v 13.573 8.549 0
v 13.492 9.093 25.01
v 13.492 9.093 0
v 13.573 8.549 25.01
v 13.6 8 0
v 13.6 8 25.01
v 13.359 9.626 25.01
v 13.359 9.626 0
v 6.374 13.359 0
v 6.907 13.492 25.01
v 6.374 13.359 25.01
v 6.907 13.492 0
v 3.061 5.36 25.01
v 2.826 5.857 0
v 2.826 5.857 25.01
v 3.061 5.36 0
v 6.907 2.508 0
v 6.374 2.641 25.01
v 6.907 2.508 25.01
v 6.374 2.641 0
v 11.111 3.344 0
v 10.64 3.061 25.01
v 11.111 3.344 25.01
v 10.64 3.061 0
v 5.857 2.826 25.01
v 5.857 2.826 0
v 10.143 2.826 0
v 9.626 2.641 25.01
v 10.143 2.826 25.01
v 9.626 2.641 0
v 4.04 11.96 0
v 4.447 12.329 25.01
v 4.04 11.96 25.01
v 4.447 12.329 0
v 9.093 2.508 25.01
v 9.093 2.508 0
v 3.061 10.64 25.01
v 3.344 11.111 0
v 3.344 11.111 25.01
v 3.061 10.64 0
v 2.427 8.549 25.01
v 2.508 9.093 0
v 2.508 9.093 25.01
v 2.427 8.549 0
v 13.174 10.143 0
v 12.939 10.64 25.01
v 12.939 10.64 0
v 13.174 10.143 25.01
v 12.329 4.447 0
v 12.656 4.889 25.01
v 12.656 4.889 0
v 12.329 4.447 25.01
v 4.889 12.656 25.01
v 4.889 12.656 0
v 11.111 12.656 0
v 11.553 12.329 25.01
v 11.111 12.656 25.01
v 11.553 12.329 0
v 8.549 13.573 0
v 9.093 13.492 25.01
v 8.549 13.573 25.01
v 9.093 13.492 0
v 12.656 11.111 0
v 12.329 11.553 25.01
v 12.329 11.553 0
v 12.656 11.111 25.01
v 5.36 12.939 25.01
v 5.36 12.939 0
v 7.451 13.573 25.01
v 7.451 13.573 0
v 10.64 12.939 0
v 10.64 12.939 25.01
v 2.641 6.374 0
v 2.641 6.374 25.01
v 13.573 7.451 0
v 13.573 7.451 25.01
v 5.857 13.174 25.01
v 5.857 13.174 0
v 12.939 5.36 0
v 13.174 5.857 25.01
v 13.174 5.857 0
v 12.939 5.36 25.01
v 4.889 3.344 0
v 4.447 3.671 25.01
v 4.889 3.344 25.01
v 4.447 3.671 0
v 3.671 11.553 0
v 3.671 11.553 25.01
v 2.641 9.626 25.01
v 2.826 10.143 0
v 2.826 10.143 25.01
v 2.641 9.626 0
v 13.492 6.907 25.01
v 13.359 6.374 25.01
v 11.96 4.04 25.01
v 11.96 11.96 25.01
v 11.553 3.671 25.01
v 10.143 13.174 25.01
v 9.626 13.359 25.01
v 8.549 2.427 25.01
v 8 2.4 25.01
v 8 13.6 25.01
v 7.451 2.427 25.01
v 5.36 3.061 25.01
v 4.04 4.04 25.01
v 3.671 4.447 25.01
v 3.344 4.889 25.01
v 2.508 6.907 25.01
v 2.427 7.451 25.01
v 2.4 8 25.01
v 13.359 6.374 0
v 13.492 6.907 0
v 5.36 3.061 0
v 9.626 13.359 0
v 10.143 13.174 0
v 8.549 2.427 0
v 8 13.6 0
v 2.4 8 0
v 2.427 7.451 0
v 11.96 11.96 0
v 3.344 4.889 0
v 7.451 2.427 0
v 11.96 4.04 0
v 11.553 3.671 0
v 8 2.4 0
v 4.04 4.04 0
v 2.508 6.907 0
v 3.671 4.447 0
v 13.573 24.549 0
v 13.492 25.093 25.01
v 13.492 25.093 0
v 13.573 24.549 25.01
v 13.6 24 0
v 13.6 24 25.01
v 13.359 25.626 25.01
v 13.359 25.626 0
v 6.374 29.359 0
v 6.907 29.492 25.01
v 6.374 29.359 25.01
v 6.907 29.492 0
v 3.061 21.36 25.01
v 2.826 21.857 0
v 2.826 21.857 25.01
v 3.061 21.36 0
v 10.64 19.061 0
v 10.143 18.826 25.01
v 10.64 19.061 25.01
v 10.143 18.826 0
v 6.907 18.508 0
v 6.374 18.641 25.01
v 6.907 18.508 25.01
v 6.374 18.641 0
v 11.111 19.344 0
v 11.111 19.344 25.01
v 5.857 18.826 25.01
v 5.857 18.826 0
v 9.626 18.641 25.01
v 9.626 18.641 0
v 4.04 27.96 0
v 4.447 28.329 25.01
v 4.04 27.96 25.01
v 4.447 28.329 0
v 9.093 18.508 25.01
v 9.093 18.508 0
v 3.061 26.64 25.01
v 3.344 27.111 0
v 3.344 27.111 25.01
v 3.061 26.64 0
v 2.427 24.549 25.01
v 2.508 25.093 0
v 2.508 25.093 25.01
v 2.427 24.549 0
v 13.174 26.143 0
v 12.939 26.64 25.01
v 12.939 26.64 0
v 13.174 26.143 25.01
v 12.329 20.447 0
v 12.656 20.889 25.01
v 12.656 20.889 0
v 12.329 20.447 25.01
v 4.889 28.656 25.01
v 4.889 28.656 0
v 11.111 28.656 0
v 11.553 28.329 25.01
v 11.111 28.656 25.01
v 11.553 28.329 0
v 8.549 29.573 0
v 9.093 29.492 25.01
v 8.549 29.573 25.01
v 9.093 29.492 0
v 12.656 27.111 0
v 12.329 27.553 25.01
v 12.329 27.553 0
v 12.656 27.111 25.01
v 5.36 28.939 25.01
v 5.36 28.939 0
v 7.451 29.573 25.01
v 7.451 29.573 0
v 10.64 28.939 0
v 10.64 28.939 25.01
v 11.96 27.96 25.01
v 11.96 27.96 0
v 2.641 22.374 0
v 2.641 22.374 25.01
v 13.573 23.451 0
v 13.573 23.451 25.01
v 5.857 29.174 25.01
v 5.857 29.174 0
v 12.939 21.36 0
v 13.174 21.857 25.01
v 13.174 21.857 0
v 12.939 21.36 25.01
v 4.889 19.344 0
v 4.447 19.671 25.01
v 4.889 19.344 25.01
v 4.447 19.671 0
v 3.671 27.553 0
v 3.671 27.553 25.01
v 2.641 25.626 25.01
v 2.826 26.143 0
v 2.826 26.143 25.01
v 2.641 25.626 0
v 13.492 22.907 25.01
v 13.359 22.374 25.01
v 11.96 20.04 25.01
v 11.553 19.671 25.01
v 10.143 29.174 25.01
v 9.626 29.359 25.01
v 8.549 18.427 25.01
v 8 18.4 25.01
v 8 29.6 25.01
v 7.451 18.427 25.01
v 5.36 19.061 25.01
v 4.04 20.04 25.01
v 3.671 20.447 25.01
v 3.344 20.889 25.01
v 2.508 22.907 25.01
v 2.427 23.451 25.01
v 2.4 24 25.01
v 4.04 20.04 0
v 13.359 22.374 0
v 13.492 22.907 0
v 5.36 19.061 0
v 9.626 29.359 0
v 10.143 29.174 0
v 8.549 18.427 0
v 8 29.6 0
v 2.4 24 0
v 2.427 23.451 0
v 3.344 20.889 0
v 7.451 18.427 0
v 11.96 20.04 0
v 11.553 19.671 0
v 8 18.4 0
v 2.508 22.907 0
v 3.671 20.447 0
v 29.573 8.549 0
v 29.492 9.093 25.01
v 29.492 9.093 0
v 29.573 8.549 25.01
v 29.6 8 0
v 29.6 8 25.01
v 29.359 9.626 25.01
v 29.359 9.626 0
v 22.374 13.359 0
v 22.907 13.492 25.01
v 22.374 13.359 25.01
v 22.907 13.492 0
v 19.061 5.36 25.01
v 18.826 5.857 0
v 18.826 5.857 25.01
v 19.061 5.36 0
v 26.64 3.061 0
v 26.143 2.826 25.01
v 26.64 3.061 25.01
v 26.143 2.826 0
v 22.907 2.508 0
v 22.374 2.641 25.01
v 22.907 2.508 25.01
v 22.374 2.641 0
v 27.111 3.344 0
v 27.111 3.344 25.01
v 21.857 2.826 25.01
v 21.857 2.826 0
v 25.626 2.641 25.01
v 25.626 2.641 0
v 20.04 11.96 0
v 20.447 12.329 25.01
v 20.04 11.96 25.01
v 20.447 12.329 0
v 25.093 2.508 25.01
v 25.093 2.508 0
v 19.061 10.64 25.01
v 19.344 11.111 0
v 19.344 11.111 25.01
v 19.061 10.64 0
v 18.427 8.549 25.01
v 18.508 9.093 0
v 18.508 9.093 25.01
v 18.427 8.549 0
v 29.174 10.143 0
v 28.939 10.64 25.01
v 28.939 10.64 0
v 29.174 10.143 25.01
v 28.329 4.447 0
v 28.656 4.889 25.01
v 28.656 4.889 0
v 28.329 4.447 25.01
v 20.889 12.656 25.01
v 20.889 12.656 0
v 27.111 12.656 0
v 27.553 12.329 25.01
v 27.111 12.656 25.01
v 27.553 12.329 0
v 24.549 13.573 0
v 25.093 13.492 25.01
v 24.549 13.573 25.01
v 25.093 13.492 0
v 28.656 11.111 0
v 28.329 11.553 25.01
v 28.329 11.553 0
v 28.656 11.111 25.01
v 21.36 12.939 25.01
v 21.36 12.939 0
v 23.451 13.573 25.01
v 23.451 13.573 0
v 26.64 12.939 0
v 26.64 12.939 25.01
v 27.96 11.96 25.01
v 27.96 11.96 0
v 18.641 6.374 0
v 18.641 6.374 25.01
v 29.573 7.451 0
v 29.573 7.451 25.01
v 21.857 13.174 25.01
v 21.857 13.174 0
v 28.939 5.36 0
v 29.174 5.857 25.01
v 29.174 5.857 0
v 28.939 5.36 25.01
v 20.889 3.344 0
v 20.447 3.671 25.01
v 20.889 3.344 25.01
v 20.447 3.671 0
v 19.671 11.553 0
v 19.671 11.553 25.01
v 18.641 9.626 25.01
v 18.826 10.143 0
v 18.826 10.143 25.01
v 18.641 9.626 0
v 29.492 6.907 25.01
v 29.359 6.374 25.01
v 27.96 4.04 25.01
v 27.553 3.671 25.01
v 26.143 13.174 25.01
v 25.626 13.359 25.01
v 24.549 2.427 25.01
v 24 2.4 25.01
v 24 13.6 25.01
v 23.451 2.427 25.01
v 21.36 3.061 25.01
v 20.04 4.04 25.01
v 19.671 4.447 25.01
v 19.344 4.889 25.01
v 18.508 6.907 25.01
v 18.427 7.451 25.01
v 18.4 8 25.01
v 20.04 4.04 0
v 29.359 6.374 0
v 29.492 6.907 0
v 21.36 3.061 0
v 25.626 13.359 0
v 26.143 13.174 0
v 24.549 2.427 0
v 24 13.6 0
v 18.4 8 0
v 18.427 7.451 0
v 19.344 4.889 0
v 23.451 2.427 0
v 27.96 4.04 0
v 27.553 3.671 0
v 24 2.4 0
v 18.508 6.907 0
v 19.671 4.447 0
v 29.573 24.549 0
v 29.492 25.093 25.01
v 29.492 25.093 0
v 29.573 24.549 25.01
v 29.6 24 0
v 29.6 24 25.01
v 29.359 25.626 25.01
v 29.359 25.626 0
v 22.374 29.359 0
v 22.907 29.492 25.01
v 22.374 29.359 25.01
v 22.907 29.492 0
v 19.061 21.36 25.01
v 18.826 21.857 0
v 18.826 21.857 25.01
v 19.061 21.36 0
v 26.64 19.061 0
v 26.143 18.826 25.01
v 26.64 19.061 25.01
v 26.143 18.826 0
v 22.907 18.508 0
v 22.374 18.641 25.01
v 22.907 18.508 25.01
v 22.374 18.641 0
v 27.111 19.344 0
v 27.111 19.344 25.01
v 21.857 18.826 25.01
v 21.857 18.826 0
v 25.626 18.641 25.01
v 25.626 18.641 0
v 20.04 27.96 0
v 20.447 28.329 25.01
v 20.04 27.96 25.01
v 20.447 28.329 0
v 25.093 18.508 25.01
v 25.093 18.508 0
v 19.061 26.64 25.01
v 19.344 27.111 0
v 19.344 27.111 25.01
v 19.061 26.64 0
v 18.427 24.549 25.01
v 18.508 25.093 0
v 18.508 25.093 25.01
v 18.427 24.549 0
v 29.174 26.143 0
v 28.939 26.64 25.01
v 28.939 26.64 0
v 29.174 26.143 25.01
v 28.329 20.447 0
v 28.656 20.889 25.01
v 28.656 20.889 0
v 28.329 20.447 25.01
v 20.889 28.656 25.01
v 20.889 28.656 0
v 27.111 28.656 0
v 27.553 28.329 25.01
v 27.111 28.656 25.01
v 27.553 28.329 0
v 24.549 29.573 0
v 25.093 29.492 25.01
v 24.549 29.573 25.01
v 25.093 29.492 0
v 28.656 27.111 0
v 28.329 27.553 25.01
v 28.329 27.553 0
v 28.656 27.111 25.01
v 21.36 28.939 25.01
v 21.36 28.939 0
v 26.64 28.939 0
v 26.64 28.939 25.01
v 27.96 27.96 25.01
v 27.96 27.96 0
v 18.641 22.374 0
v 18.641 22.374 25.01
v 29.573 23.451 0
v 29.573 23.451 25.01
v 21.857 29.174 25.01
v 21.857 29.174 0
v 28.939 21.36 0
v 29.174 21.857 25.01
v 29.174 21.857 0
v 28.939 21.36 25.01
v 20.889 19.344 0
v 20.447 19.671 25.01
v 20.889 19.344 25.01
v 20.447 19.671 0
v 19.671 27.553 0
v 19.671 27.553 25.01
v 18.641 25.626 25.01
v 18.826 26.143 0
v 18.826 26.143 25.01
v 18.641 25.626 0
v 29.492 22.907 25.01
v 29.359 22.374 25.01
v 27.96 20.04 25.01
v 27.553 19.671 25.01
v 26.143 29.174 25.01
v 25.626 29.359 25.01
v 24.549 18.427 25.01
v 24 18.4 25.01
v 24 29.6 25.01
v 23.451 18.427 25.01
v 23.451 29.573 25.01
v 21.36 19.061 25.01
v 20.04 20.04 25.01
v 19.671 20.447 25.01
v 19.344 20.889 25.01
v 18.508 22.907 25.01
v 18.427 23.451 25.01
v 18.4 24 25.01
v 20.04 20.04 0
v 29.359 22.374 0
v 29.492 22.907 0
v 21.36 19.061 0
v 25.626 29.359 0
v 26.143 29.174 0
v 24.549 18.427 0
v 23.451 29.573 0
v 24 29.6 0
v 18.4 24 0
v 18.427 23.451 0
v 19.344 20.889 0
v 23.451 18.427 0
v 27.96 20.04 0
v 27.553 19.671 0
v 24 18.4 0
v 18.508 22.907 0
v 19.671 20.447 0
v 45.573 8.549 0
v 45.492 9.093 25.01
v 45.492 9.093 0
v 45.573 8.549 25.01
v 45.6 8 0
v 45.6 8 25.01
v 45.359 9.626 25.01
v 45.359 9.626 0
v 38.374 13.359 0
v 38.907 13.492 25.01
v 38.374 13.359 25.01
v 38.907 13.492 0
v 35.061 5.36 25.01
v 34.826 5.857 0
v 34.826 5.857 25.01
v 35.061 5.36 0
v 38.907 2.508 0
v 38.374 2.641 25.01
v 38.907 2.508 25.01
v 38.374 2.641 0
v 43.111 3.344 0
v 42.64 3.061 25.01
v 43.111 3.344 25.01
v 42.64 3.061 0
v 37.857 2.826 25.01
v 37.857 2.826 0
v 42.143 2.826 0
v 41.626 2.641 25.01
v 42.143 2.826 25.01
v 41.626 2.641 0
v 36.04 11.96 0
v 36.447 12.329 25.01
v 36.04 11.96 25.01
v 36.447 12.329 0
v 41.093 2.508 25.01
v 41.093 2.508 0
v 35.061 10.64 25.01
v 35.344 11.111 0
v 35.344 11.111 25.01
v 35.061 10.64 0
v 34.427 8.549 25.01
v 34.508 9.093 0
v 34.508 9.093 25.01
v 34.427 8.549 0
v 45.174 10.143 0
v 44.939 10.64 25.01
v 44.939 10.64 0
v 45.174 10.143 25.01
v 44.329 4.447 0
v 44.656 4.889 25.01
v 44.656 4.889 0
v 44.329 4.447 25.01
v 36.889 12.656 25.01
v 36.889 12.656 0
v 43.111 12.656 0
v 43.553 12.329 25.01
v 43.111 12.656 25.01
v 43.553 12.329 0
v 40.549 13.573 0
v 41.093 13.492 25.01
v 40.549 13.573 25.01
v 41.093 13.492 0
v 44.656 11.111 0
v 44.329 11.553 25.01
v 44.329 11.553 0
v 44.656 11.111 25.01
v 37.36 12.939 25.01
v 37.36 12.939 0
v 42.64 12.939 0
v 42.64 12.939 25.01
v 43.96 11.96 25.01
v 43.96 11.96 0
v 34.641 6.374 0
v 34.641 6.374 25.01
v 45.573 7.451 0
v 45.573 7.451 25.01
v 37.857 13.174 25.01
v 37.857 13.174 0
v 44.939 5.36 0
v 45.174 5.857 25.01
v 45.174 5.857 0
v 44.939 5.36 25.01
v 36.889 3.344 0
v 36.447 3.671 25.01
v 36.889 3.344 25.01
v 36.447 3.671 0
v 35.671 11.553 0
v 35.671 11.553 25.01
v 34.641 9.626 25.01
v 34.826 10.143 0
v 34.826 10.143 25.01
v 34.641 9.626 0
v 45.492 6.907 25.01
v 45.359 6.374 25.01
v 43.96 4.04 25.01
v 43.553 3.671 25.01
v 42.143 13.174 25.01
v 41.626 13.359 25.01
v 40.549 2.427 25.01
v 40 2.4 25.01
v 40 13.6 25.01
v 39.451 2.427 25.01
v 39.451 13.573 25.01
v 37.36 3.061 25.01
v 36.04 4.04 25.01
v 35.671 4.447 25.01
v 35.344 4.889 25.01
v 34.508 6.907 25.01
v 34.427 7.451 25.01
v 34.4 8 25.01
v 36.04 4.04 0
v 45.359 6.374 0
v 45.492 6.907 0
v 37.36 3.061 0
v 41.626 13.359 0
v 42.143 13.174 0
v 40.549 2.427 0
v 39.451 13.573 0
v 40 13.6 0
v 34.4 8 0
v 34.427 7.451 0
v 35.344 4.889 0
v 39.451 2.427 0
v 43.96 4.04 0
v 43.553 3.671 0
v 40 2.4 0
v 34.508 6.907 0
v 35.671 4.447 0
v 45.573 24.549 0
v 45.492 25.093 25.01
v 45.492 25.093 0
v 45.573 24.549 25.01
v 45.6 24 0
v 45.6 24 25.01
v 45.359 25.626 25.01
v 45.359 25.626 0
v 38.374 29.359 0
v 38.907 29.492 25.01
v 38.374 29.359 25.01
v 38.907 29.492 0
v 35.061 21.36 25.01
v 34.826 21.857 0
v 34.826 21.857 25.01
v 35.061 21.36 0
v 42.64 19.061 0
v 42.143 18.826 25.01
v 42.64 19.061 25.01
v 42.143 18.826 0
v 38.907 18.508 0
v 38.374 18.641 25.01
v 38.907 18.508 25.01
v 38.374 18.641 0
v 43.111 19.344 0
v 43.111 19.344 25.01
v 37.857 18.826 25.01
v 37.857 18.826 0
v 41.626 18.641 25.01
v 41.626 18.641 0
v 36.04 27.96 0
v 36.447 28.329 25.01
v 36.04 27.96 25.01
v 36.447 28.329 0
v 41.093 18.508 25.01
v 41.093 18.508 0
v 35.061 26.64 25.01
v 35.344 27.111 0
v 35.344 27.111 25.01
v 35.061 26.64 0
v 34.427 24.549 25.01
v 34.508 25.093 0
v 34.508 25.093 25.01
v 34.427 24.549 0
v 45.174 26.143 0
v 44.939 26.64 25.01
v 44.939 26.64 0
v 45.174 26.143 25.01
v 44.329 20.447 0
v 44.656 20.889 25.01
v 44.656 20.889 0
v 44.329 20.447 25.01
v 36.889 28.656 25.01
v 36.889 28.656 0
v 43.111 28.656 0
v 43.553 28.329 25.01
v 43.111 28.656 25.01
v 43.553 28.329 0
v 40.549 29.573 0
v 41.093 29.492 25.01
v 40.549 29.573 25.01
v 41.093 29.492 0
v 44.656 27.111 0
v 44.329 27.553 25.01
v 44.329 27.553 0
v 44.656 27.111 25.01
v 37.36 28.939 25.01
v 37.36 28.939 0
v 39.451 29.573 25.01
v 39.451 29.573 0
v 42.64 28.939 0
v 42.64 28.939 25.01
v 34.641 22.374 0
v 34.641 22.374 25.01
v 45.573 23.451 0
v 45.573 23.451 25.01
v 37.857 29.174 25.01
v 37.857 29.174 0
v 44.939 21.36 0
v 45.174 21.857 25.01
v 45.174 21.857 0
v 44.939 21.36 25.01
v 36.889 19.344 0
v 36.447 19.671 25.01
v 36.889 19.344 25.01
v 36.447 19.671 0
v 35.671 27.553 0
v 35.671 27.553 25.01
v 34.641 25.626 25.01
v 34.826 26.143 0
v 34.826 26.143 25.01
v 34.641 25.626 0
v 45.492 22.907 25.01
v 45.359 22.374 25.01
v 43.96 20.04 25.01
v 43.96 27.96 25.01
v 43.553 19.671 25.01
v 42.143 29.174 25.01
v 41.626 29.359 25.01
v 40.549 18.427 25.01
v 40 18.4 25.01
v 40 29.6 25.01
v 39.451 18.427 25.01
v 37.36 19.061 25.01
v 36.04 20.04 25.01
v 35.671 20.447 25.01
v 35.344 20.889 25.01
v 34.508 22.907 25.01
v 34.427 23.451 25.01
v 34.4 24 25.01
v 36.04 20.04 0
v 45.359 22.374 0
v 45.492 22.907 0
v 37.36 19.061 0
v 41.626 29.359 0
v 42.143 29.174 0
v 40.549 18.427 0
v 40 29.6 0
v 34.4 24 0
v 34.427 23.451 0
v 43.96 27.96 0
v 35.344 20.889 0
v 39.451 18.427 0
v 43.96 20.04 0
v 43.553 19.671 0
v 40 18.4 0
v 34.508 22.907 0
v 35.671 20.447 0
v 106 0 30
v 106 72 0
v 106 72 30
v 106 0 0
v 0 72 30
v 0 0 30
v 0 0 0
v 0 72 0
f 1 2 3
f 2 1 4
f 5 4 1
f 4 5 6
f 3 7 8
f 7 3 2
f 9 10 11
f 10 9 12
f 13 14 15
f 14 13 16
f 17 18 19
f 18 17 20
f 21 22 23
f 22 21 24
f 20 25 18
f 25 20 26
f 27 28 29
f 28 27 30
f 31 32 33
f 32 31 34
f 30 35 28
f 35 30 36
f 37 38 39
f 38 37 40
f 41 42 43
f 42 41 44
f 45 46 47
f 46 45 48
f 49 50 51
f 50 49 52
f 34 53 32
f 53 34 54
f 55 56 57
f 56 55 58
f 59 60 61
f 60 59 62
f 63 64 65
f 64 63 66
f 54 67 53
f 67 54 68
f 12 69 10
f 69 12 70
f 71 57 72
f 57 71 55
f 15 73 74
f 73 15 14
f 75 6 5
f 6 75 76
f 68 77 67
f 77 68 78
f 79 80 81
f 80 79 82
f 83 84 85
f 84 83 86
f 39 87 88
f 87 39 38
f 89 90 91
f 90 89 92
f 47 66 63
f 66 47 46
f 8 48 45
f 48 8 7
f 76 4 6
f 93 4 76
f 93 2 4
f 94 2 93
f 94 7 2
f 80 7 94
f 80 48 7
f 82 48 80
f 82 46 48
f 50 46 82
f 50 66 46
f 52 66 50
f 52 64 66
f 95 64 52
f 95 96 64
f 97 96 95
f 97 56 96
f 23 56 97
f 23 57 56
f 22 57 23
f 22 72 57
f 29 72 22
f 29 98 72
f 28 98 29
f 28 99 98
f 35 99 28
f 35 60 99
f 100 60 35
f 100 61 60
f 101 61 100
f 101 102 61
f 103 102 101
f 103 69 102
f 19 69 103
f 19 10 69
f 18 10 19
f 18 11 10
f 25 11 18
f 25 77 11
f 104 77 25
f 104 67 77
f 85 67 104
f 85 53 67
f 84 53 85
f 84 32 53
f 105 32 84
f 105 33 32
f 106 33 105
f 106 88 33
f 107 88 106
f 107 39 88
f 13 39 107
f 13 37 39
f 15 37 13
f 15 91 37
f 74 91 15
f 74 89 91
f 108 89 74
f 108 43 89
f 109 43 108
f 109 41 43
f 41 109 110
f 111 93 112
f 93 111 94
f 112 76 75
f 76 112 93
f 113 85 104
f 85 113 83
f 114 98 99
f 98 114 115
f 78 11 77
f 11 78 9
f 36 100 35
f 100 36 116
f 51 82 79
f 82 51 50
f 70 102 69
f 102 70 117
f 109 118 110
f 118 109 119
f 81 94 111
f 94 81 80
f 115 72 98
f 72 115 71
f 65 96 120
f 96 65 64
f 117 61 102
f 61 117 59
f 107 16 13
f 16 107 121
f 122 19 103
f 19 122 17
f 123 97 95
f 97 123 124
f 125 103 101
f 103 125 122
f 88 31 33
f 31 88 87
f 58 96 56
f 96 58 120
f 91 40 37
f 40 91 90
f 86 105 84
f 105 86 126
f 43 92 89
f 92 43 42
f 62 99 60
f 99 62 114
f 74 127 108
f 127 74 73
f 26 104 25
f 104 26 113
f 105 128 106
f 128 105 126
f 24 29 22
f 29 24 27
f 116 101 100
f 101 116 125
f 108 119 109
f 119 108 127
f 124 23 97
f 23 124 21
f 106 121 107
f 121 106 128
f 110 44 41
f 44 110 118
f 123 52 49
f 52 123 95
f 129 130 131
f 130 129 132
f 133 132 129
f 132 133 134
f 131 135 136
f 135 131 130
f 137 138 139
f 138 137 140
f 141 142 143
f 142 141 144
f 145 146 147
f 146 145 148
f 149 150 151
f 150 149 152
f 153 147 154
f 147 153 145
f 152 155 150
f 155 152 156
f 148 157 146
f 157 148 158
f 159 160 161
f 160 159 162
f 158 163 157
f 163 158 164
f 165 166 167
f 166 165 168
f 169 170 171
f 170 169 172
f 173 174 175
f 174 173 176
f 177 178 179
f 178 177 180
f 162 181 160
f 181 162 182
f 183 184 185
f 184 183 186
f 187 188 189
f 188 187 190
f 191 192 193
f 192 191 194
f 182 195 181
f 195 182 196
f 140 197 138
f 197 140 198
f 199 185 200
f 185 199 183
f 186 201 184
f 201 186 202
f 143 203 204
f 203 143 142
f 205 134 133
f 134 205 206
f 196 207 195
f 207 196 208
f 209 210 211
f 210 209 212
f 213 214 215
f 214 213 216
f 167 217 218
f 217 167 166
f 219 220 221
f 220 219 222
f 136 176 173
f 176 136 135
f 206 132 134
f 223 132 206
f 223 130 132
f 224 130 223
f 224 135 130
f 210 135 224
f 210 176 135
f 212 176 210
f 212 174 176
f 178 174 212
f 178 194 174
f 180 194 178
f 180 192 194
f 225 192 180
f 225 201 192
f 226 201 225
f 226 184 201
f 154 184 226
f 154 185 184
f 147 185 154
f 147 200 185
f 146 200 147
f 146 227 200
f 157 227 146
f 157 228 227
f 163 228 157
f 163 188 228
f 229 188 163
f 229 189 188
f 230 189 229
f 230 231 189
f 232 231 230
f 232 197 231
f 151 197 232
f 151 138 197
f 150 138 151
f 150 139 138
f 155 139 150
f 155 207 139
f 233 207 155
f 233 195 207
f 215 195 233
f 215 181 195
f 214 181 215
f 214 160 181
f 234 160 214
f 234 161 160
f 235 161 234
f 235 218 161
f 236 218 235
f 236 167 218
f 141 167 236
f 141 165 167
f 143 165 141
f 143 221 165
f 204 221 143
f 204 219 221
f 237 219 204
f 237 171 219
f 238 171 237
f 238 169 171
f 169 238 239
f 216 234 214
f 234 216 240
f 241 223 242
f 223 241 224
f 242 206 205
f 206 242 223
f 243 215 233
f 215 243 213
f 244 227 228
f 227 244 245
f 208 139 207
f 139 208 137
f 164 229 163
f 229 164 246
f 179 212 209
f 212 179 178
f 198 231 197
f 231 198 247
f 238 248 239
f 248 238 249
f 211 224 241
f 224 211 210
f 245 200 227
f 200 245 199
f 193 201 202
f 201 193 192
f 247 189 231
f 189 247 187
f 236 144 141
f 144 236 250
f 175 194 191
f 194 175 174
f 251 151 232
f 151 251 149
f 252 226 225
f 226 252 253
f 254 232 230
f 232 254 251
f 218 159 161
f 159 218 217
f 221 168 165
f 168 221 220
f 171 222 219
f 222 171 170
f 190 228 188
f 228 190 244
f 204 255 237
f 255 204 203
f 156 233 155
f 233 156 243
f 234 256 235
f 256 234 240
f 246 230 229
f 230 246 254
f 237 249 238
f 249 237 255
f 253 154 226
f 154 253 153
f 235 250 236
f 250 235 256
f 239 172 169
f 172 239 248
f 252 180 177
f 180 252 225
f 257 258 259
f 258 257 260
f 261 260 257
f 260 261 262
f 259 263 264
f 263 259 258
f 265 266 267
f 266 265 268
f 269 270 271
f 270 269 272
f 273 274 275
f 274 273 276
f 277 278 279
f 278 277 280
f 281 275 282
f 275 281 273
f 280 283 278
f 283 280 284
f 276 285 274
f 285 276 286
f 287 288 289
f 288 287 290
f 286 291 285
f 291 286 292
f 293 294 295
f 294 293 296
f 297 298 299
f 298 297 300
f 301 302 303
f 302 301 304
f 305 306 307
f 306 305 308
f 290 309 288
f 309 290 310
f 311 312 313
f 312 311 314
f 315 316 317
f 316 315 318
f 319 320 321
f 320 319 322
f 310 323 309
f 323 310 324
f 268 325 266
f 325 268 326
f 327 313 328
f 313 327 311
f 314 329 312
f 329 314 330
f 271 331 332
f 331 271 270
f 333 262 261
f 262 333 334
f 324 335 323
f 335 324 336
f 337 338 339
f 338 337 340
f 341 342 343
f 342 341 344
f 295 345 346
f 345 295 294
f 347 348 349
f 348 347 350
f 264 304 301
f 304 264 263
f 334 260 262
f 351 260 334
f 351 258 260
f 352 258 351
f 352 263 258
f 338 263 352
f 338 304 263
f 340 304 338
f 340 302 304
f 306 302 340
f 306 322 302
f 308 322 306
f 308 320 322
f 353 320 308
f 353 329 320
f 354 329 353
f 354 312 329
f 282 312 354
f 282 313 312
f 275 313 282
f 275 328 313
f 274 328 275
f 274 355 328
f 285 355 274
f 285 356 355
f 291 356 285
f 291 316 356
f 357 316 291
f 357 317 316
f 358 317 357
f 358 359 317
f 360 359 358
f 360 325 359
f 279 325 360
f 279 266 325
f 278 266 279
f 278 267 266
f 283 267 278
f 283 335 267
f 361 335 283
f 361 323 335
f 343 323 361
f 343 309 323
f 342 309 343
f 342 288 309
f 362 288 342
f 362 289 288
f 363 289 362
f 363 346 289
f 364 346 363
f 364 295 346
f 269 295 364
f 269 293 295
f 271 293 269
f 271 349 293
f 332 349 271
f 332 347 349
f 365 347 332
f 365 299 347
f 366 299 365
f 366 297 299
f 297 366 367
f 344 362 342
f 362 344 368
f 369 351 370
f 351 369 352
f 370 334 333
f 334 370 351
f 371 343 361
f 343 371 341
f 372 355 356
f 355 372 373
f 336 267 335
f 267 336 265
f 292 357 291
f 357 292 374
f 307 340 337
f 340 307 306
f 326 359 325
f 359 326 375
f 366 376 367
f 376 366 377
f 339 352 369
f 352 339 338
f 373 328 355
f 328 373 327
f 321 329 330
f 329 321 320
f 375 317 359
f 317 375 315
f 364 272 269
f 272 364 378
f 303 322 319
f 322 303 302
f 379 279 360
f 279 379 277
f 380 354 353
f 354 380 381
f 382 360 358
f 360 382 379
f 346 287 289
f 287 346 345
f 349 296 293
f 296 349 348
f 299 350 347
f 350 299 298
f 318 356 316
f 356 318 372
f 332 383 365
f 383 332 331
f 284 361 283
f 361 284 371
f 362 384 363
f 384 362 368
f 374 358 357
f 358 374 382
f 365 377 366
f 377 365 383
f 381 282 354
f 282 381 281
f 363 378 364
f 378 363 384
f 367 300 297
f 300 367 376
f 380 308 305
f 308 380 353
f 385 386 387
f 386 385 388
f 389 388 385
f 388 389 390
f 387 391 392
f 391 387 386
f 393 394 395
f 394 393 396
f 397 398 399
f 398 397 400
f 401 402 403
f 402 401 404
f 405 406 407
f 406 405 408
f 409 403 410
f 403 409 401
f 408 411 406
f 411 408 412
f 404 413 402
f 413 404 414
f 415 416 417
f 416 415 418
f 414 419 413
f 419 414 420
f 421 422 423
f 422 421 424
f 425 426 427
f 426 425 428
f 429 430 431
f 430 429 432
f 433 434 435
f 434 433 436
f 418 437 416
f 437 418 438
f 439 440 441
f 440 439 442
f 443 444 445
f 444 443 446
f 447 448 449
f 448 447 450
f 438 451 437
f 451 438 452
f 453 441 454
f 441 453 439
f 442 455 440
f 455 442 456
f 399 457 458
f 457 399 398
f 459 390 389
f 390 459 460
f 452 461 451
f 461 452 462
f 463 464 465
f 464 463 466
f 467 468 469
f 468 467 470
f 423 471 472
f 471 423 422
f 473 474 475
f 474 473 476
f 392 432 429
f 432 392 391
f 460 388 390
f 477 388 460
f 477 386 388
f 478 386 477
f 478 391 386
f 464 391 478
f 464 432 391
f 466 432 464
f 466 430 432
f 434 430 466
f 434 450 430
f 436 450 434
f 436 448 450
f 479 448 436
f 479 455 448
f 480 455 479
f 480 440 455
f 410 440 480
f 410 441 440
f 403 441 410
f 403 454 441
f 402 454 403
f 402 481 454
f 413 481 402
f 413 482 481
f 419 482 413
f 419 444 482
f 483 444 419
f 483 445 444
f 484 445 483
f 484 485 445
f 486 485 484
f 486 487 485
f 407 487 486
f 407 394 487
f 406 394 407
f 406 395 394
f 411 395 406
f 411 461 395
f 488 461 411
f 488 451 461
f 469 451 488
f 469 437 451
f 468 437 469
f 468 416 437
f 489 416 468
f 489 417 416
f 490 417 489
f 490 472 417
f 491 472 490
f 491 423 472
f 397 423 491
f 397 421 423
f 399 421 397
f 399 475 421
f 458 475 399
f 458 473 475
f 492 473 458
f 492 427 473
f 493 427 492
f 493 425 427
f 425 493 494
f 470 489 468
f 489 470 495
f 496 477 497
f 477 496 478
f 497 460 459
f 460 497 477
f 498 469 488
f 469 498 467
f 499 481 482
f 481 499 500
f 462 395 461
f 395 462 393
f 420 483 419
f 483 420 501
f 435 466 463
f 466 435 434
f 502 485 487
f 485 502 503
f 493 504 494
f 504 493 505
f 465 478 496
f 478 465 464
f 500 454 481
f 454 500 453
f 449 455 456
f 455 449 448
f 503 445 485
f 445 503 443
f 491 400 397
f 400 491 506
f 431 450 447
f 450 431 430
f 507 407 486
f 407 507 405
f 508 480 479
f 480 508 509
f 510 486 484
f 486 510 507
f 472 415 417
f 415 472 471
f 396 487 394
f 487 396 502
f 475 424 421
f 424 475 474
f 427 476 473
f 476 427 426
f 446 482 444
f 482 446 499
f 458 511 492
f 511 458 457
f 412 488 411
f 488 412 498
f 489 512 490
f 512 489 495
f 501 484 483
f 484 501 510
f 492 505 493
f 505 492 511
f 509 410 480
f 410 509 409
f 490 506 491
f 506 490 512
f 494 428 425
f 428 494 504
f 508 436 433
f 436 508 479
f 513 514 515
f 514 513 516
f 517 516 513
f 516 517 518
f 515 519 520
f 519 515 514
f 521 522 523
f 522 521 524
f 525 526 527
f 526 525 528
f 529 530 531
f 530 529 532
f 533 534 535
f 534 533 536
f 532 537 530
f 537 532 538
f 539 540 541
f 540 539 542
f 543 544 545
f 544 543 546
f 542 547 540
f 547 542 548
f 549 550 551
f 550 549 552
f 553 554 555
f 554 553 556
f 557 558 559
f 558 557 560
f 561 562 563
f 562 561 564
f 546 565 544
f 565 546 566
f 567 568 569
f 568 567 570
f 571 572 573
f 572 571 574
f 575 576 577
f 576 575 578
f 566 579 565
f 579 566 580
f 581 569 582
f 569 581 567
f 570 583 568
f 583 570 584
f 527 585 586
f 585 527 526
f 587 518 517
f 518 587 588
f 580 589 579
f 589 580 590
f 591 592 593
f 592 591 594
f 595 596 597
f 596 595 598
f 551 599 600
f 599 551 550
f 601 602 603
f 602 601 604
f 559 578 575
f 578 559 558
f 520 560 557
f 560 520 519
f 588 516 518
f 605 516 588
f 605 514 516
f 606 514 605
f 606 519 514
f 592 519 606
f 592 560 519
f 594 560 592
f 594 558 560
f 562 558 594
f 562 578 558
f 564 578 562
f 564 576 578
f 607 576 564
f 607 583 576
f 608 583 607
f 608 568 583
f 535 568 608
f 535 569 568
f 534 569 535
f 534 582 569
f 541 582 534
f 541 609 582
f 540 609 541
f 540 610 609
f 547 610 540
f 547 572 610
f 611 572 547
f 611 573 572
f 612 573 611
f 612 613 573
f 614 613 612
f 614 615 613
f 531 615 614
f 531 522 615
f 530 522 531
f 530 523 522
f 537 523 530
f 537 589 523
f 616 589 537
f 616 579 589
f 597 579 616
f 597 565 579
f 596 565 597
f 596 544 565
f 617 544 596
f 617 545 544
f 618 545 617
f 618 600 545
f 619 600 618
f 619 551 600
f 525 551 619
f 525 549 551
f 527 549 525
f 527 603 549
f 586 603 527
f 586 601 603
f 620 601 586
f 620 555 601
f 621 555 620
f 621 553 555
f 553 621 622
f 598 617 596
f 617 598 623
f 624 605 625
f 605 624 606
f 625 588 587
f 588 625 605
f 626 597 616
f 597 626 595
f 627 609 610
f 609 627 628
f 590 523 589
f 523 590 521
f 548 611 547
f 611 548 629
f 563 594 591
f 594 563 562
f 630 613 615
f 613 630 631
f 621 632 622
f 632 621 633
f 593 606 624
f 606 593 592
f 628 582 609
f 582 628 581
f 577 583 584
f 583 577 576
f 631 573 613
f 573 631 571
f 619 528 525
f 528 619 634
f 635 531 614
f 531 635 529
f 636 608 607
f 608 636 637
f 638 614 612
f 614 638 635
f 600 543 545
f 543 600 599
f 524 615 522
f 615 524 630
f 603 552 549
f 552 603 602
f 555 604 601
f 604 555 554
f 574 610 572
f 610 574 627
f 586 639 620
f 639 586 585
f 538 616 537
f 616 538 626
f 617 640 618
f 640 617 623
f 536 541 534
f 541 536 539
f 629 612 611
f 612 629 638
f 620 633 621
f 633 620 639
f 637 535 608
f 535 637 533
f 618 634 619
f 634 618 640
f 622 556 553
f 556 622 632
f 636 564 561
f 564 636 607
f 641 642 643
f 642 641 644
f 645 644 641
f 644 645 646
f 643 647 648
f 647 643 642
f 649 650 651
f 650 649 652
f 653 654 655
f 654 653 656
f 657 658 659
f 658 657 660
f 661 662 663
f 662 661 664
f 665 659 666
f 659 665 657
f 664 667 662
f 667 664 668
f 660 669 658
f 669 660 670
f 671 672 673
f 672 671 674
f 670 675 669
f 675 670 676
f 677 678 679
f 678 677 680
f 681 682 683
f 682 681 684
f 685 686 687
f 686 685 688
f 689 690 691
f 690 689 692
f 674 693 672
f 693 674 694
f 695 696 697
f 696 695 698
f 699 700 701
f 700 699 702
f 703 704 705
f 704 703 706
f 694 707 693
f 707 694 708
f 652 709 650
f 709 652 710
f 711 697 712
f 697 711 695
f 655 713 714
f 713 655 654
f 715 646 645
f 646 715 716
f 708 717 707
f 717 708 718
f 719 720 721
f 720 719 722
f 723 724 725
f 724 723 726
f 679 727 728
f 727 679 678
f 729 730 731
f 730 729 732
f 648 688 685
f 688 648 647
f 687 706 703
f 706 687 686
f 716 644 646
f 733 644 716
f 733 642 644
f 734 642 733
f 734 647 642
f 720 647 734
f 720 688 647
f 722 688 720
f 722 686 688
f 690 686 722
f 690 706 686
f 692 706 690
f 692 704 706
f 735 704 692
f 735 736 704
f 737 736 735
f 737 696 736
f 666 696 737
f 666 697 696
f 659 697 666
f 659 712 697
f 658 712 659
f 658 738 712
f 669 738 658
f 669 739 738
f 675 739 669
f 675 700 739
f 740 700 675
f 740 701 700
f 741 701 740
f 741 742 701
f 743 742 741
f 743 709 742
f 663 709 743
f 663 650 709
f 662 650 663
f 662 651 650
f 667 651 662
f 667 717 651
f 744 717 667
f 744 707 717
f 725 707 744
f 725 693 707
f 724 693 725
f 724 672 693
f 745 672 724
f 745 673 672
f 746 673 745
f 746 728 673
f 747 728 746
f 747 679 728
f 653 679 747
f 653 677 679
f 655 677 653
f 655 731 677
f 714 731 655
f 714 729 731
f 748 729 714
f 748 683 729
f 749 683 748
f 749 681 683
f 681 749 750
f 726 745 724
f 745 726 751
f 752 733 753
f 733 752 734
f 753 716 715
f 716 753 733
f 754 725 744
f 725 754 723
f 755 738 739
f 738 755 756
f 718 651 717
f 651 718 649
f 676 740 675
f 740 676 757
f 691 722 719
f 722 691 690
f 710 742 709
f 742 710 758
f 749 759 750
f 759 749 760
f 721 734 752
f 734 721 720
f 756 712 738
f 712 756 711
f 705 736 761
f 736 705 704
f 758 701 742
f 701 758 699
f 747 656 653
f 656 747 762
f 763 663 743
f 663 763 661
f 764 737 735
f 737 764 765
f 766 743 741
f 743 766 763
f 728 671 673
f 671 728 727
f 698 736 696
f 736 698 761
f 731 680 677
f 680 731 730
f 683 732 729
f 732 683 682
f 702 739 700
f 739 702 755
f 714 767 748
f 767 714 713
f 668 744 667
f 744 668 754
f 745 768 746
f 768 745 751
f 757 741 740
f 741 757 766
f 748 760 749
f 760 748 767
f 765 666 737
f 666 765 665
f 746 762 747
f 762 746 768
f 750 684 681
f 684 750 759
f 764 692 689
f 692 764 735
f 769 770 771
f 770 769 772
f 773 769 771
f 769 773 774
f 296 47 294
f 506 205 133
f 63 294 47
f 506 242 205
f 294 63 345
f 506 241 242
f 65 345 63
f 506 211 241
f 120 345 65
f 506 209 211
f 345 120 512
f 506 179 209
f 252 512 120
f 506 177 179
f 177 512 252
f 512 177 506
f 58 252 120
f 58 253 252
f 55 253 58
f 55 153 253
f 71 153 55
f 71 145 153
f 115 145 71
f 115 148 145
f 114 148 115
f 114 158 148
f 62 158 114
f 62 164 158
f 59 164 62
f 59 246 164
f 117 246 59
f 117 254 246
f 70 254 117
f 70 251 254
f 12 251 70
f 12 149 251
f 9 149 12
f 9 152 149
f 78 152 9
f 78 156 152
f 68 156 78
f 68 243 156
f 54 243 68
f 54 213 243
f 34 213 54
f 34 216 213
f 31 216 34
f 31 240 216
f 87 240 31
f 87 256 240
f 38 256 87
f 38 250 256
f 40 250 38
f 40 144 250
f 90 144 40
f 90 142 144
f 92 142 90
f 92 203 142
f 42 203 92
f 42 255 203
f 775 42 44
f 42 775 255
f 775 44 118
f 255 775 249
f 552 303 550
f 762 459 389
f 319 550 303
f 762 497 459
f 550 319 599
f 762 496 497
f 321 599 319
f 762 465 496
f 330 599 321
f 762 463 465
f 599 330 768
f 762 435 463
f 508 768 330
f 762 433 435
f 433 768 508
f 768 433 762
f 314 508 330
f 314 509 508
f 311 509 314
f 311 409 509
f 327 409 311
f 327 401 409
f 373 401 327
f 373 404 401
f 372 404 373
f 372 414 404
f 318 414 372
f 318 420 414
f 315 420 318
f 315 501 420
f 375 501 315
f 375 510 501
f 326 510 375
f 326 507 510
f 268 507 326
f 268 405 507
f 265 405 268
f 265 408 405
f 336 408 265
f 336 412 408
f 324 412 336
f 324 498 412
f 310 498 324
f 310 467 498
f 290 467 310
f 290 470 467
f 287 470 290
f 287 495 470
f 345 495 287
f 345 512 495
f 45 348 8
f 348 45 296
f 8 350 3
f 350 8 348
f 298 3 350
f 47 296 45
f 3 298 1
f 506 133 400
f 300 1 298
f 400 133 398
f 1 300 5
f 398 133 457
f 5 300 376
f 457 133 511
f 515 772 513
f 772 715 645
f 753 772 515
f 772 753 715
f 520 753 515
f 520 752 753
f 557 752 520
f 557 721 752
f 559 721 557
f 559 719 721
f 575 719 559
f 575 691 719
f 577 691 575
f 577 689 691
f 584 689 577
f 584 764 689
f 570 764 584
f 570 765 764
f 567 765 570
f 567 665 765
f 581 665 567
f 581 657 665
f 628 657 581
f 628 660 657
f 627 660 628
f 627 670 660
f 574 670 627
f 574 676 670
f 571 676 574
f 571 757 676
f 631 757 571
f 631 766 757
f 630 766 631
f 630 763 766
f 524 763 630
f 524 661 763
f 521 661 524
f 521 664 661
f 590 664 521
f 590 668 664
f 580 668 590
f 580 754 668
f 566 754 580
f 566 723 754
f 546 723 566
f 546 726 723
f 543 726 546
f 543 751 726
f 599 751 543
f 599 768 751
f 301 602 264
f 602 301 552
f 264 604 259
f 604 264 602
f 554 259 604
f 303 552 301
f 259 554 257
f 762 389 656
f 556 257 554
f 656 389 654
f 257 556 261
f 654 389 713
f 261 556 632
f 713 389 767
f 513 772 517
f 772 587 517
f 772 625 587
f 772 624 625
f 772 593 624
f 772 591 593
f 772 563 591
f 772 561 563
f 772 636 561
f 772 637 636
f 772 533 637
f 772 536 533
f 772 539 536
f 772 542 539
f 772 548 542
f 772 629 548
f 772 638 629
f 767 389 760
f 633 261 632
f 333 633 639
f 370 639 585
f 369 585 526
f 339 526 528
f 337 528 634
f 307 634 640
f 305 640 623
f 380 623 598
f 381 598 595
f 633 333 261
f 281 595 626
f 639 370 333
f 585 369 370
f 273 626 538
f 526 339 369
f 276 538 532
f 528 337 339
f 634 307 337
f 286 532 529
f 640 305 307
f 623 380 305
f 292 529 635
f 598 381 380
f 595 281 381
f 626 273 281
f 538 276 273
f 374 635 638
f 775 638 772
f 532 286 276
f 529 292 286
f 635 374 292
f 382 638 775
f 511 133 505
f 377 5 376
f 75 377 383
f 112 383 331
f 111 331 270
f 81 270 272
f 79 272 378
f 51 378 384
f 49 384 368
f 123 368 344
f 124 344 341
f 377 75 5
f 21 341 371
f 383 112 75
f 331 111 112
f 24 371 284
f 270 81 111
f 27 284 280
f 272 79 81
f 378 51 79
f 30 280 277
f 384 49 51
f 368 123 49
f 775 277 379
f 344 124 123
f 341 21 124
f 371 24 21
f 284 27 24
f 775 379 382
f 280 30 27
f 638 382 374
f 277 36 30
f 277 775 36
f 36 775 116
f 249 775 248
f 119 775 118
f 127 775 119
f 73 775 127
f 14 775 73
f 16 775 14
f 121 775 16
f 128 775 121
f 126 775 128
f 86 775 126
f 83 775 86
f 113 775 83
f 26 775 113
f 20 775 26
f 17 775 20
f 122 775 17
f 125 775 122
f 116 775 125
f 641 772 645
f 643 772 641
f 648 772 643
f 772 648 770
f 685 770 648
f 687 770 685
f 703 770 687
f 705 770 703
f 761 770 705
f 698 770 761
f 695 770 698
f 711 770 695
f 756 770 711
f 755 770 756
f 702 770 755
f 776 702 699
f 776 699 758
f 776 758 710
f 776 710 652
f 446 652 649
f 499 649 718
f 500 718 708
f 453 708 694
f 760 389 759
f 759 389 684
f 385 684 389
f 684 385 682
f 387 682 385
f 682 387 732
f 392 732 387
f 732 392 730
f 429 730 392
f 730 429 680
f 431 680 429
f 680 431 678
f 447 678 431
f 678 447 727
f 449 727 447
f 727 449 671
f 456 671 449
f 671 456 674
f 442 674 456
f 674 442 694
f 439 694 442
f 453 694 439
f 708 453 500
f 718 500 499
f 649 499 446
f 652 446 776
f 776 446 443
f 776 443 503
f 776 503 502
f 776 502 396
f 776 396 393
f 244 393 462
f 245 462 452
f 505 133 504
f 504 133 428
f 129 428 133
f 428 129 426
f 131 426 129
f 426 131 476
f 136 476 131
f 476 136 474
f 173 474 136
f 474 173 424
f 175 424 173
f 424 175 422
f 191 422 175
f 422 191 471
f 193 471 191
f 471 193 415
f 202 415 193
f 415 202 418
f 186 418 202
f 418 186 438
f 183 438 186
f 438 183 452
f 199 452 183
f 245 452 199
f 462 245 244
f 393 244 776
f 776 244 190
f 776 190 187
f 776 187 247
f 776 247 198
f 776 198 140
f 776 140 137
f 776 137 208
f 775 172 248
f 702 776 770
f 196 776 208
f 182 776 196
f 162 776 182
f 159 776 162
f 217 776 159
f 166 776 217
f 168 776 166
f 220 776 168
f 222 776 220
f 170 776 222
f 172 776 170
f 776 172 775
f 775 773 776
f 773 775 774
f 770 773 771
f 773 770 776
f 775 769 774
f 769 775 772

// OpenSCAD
$fn = 64;

// Block dimensions
BLK_X = 106;      // Length in X (mm)
BLK_Y = 72;       // Width in Y (mm)
BLK_Z = 30;       // Height in Z (mm)

// Hole grid parameters
COLS = 6;         // Number of holes along X
ROWS = 4;         // Number of holes along Y
SPACING_X = 16;   // Centre-to-centre spacing in X (mm)
SPACING_Y = 16;   // Centre-to-centre spacing in Y (mm)
HOLE_DIA = 11.2;  // Diameter of each hole (mm)
HOLE_DEPTH = 25;  // Depth of each hole from top (mm)
FLOOR_THICK = 5;  // Solid floor thickness at bottom (mm)

// Derived dimensions
HOLE_R = HOLE_DIA / 2;
GRID_W_X = (COLS - 1) * SPACING_X;
GRID_W_Y = (ROWS - 1) * SPACING_Y;

difference() {
    // Main solid block, centred in X and Y
    cube([BLK_X, BLK_Y, BLK_Z], center=[true, true, false]);
    
    // Cut holes
    for (i = [0:COLS-1]) {
        for (j = [0:ROWS-1]) {
            translate([i * SPACING_X - GRID_W_X / 2, j * SPACING_Y - GRID_W_Y / 2, -0.01])
                cylinder(r=HOLE_R, h=HOLE_DEPTH + 0.02, center=false);
        }
    }
}
